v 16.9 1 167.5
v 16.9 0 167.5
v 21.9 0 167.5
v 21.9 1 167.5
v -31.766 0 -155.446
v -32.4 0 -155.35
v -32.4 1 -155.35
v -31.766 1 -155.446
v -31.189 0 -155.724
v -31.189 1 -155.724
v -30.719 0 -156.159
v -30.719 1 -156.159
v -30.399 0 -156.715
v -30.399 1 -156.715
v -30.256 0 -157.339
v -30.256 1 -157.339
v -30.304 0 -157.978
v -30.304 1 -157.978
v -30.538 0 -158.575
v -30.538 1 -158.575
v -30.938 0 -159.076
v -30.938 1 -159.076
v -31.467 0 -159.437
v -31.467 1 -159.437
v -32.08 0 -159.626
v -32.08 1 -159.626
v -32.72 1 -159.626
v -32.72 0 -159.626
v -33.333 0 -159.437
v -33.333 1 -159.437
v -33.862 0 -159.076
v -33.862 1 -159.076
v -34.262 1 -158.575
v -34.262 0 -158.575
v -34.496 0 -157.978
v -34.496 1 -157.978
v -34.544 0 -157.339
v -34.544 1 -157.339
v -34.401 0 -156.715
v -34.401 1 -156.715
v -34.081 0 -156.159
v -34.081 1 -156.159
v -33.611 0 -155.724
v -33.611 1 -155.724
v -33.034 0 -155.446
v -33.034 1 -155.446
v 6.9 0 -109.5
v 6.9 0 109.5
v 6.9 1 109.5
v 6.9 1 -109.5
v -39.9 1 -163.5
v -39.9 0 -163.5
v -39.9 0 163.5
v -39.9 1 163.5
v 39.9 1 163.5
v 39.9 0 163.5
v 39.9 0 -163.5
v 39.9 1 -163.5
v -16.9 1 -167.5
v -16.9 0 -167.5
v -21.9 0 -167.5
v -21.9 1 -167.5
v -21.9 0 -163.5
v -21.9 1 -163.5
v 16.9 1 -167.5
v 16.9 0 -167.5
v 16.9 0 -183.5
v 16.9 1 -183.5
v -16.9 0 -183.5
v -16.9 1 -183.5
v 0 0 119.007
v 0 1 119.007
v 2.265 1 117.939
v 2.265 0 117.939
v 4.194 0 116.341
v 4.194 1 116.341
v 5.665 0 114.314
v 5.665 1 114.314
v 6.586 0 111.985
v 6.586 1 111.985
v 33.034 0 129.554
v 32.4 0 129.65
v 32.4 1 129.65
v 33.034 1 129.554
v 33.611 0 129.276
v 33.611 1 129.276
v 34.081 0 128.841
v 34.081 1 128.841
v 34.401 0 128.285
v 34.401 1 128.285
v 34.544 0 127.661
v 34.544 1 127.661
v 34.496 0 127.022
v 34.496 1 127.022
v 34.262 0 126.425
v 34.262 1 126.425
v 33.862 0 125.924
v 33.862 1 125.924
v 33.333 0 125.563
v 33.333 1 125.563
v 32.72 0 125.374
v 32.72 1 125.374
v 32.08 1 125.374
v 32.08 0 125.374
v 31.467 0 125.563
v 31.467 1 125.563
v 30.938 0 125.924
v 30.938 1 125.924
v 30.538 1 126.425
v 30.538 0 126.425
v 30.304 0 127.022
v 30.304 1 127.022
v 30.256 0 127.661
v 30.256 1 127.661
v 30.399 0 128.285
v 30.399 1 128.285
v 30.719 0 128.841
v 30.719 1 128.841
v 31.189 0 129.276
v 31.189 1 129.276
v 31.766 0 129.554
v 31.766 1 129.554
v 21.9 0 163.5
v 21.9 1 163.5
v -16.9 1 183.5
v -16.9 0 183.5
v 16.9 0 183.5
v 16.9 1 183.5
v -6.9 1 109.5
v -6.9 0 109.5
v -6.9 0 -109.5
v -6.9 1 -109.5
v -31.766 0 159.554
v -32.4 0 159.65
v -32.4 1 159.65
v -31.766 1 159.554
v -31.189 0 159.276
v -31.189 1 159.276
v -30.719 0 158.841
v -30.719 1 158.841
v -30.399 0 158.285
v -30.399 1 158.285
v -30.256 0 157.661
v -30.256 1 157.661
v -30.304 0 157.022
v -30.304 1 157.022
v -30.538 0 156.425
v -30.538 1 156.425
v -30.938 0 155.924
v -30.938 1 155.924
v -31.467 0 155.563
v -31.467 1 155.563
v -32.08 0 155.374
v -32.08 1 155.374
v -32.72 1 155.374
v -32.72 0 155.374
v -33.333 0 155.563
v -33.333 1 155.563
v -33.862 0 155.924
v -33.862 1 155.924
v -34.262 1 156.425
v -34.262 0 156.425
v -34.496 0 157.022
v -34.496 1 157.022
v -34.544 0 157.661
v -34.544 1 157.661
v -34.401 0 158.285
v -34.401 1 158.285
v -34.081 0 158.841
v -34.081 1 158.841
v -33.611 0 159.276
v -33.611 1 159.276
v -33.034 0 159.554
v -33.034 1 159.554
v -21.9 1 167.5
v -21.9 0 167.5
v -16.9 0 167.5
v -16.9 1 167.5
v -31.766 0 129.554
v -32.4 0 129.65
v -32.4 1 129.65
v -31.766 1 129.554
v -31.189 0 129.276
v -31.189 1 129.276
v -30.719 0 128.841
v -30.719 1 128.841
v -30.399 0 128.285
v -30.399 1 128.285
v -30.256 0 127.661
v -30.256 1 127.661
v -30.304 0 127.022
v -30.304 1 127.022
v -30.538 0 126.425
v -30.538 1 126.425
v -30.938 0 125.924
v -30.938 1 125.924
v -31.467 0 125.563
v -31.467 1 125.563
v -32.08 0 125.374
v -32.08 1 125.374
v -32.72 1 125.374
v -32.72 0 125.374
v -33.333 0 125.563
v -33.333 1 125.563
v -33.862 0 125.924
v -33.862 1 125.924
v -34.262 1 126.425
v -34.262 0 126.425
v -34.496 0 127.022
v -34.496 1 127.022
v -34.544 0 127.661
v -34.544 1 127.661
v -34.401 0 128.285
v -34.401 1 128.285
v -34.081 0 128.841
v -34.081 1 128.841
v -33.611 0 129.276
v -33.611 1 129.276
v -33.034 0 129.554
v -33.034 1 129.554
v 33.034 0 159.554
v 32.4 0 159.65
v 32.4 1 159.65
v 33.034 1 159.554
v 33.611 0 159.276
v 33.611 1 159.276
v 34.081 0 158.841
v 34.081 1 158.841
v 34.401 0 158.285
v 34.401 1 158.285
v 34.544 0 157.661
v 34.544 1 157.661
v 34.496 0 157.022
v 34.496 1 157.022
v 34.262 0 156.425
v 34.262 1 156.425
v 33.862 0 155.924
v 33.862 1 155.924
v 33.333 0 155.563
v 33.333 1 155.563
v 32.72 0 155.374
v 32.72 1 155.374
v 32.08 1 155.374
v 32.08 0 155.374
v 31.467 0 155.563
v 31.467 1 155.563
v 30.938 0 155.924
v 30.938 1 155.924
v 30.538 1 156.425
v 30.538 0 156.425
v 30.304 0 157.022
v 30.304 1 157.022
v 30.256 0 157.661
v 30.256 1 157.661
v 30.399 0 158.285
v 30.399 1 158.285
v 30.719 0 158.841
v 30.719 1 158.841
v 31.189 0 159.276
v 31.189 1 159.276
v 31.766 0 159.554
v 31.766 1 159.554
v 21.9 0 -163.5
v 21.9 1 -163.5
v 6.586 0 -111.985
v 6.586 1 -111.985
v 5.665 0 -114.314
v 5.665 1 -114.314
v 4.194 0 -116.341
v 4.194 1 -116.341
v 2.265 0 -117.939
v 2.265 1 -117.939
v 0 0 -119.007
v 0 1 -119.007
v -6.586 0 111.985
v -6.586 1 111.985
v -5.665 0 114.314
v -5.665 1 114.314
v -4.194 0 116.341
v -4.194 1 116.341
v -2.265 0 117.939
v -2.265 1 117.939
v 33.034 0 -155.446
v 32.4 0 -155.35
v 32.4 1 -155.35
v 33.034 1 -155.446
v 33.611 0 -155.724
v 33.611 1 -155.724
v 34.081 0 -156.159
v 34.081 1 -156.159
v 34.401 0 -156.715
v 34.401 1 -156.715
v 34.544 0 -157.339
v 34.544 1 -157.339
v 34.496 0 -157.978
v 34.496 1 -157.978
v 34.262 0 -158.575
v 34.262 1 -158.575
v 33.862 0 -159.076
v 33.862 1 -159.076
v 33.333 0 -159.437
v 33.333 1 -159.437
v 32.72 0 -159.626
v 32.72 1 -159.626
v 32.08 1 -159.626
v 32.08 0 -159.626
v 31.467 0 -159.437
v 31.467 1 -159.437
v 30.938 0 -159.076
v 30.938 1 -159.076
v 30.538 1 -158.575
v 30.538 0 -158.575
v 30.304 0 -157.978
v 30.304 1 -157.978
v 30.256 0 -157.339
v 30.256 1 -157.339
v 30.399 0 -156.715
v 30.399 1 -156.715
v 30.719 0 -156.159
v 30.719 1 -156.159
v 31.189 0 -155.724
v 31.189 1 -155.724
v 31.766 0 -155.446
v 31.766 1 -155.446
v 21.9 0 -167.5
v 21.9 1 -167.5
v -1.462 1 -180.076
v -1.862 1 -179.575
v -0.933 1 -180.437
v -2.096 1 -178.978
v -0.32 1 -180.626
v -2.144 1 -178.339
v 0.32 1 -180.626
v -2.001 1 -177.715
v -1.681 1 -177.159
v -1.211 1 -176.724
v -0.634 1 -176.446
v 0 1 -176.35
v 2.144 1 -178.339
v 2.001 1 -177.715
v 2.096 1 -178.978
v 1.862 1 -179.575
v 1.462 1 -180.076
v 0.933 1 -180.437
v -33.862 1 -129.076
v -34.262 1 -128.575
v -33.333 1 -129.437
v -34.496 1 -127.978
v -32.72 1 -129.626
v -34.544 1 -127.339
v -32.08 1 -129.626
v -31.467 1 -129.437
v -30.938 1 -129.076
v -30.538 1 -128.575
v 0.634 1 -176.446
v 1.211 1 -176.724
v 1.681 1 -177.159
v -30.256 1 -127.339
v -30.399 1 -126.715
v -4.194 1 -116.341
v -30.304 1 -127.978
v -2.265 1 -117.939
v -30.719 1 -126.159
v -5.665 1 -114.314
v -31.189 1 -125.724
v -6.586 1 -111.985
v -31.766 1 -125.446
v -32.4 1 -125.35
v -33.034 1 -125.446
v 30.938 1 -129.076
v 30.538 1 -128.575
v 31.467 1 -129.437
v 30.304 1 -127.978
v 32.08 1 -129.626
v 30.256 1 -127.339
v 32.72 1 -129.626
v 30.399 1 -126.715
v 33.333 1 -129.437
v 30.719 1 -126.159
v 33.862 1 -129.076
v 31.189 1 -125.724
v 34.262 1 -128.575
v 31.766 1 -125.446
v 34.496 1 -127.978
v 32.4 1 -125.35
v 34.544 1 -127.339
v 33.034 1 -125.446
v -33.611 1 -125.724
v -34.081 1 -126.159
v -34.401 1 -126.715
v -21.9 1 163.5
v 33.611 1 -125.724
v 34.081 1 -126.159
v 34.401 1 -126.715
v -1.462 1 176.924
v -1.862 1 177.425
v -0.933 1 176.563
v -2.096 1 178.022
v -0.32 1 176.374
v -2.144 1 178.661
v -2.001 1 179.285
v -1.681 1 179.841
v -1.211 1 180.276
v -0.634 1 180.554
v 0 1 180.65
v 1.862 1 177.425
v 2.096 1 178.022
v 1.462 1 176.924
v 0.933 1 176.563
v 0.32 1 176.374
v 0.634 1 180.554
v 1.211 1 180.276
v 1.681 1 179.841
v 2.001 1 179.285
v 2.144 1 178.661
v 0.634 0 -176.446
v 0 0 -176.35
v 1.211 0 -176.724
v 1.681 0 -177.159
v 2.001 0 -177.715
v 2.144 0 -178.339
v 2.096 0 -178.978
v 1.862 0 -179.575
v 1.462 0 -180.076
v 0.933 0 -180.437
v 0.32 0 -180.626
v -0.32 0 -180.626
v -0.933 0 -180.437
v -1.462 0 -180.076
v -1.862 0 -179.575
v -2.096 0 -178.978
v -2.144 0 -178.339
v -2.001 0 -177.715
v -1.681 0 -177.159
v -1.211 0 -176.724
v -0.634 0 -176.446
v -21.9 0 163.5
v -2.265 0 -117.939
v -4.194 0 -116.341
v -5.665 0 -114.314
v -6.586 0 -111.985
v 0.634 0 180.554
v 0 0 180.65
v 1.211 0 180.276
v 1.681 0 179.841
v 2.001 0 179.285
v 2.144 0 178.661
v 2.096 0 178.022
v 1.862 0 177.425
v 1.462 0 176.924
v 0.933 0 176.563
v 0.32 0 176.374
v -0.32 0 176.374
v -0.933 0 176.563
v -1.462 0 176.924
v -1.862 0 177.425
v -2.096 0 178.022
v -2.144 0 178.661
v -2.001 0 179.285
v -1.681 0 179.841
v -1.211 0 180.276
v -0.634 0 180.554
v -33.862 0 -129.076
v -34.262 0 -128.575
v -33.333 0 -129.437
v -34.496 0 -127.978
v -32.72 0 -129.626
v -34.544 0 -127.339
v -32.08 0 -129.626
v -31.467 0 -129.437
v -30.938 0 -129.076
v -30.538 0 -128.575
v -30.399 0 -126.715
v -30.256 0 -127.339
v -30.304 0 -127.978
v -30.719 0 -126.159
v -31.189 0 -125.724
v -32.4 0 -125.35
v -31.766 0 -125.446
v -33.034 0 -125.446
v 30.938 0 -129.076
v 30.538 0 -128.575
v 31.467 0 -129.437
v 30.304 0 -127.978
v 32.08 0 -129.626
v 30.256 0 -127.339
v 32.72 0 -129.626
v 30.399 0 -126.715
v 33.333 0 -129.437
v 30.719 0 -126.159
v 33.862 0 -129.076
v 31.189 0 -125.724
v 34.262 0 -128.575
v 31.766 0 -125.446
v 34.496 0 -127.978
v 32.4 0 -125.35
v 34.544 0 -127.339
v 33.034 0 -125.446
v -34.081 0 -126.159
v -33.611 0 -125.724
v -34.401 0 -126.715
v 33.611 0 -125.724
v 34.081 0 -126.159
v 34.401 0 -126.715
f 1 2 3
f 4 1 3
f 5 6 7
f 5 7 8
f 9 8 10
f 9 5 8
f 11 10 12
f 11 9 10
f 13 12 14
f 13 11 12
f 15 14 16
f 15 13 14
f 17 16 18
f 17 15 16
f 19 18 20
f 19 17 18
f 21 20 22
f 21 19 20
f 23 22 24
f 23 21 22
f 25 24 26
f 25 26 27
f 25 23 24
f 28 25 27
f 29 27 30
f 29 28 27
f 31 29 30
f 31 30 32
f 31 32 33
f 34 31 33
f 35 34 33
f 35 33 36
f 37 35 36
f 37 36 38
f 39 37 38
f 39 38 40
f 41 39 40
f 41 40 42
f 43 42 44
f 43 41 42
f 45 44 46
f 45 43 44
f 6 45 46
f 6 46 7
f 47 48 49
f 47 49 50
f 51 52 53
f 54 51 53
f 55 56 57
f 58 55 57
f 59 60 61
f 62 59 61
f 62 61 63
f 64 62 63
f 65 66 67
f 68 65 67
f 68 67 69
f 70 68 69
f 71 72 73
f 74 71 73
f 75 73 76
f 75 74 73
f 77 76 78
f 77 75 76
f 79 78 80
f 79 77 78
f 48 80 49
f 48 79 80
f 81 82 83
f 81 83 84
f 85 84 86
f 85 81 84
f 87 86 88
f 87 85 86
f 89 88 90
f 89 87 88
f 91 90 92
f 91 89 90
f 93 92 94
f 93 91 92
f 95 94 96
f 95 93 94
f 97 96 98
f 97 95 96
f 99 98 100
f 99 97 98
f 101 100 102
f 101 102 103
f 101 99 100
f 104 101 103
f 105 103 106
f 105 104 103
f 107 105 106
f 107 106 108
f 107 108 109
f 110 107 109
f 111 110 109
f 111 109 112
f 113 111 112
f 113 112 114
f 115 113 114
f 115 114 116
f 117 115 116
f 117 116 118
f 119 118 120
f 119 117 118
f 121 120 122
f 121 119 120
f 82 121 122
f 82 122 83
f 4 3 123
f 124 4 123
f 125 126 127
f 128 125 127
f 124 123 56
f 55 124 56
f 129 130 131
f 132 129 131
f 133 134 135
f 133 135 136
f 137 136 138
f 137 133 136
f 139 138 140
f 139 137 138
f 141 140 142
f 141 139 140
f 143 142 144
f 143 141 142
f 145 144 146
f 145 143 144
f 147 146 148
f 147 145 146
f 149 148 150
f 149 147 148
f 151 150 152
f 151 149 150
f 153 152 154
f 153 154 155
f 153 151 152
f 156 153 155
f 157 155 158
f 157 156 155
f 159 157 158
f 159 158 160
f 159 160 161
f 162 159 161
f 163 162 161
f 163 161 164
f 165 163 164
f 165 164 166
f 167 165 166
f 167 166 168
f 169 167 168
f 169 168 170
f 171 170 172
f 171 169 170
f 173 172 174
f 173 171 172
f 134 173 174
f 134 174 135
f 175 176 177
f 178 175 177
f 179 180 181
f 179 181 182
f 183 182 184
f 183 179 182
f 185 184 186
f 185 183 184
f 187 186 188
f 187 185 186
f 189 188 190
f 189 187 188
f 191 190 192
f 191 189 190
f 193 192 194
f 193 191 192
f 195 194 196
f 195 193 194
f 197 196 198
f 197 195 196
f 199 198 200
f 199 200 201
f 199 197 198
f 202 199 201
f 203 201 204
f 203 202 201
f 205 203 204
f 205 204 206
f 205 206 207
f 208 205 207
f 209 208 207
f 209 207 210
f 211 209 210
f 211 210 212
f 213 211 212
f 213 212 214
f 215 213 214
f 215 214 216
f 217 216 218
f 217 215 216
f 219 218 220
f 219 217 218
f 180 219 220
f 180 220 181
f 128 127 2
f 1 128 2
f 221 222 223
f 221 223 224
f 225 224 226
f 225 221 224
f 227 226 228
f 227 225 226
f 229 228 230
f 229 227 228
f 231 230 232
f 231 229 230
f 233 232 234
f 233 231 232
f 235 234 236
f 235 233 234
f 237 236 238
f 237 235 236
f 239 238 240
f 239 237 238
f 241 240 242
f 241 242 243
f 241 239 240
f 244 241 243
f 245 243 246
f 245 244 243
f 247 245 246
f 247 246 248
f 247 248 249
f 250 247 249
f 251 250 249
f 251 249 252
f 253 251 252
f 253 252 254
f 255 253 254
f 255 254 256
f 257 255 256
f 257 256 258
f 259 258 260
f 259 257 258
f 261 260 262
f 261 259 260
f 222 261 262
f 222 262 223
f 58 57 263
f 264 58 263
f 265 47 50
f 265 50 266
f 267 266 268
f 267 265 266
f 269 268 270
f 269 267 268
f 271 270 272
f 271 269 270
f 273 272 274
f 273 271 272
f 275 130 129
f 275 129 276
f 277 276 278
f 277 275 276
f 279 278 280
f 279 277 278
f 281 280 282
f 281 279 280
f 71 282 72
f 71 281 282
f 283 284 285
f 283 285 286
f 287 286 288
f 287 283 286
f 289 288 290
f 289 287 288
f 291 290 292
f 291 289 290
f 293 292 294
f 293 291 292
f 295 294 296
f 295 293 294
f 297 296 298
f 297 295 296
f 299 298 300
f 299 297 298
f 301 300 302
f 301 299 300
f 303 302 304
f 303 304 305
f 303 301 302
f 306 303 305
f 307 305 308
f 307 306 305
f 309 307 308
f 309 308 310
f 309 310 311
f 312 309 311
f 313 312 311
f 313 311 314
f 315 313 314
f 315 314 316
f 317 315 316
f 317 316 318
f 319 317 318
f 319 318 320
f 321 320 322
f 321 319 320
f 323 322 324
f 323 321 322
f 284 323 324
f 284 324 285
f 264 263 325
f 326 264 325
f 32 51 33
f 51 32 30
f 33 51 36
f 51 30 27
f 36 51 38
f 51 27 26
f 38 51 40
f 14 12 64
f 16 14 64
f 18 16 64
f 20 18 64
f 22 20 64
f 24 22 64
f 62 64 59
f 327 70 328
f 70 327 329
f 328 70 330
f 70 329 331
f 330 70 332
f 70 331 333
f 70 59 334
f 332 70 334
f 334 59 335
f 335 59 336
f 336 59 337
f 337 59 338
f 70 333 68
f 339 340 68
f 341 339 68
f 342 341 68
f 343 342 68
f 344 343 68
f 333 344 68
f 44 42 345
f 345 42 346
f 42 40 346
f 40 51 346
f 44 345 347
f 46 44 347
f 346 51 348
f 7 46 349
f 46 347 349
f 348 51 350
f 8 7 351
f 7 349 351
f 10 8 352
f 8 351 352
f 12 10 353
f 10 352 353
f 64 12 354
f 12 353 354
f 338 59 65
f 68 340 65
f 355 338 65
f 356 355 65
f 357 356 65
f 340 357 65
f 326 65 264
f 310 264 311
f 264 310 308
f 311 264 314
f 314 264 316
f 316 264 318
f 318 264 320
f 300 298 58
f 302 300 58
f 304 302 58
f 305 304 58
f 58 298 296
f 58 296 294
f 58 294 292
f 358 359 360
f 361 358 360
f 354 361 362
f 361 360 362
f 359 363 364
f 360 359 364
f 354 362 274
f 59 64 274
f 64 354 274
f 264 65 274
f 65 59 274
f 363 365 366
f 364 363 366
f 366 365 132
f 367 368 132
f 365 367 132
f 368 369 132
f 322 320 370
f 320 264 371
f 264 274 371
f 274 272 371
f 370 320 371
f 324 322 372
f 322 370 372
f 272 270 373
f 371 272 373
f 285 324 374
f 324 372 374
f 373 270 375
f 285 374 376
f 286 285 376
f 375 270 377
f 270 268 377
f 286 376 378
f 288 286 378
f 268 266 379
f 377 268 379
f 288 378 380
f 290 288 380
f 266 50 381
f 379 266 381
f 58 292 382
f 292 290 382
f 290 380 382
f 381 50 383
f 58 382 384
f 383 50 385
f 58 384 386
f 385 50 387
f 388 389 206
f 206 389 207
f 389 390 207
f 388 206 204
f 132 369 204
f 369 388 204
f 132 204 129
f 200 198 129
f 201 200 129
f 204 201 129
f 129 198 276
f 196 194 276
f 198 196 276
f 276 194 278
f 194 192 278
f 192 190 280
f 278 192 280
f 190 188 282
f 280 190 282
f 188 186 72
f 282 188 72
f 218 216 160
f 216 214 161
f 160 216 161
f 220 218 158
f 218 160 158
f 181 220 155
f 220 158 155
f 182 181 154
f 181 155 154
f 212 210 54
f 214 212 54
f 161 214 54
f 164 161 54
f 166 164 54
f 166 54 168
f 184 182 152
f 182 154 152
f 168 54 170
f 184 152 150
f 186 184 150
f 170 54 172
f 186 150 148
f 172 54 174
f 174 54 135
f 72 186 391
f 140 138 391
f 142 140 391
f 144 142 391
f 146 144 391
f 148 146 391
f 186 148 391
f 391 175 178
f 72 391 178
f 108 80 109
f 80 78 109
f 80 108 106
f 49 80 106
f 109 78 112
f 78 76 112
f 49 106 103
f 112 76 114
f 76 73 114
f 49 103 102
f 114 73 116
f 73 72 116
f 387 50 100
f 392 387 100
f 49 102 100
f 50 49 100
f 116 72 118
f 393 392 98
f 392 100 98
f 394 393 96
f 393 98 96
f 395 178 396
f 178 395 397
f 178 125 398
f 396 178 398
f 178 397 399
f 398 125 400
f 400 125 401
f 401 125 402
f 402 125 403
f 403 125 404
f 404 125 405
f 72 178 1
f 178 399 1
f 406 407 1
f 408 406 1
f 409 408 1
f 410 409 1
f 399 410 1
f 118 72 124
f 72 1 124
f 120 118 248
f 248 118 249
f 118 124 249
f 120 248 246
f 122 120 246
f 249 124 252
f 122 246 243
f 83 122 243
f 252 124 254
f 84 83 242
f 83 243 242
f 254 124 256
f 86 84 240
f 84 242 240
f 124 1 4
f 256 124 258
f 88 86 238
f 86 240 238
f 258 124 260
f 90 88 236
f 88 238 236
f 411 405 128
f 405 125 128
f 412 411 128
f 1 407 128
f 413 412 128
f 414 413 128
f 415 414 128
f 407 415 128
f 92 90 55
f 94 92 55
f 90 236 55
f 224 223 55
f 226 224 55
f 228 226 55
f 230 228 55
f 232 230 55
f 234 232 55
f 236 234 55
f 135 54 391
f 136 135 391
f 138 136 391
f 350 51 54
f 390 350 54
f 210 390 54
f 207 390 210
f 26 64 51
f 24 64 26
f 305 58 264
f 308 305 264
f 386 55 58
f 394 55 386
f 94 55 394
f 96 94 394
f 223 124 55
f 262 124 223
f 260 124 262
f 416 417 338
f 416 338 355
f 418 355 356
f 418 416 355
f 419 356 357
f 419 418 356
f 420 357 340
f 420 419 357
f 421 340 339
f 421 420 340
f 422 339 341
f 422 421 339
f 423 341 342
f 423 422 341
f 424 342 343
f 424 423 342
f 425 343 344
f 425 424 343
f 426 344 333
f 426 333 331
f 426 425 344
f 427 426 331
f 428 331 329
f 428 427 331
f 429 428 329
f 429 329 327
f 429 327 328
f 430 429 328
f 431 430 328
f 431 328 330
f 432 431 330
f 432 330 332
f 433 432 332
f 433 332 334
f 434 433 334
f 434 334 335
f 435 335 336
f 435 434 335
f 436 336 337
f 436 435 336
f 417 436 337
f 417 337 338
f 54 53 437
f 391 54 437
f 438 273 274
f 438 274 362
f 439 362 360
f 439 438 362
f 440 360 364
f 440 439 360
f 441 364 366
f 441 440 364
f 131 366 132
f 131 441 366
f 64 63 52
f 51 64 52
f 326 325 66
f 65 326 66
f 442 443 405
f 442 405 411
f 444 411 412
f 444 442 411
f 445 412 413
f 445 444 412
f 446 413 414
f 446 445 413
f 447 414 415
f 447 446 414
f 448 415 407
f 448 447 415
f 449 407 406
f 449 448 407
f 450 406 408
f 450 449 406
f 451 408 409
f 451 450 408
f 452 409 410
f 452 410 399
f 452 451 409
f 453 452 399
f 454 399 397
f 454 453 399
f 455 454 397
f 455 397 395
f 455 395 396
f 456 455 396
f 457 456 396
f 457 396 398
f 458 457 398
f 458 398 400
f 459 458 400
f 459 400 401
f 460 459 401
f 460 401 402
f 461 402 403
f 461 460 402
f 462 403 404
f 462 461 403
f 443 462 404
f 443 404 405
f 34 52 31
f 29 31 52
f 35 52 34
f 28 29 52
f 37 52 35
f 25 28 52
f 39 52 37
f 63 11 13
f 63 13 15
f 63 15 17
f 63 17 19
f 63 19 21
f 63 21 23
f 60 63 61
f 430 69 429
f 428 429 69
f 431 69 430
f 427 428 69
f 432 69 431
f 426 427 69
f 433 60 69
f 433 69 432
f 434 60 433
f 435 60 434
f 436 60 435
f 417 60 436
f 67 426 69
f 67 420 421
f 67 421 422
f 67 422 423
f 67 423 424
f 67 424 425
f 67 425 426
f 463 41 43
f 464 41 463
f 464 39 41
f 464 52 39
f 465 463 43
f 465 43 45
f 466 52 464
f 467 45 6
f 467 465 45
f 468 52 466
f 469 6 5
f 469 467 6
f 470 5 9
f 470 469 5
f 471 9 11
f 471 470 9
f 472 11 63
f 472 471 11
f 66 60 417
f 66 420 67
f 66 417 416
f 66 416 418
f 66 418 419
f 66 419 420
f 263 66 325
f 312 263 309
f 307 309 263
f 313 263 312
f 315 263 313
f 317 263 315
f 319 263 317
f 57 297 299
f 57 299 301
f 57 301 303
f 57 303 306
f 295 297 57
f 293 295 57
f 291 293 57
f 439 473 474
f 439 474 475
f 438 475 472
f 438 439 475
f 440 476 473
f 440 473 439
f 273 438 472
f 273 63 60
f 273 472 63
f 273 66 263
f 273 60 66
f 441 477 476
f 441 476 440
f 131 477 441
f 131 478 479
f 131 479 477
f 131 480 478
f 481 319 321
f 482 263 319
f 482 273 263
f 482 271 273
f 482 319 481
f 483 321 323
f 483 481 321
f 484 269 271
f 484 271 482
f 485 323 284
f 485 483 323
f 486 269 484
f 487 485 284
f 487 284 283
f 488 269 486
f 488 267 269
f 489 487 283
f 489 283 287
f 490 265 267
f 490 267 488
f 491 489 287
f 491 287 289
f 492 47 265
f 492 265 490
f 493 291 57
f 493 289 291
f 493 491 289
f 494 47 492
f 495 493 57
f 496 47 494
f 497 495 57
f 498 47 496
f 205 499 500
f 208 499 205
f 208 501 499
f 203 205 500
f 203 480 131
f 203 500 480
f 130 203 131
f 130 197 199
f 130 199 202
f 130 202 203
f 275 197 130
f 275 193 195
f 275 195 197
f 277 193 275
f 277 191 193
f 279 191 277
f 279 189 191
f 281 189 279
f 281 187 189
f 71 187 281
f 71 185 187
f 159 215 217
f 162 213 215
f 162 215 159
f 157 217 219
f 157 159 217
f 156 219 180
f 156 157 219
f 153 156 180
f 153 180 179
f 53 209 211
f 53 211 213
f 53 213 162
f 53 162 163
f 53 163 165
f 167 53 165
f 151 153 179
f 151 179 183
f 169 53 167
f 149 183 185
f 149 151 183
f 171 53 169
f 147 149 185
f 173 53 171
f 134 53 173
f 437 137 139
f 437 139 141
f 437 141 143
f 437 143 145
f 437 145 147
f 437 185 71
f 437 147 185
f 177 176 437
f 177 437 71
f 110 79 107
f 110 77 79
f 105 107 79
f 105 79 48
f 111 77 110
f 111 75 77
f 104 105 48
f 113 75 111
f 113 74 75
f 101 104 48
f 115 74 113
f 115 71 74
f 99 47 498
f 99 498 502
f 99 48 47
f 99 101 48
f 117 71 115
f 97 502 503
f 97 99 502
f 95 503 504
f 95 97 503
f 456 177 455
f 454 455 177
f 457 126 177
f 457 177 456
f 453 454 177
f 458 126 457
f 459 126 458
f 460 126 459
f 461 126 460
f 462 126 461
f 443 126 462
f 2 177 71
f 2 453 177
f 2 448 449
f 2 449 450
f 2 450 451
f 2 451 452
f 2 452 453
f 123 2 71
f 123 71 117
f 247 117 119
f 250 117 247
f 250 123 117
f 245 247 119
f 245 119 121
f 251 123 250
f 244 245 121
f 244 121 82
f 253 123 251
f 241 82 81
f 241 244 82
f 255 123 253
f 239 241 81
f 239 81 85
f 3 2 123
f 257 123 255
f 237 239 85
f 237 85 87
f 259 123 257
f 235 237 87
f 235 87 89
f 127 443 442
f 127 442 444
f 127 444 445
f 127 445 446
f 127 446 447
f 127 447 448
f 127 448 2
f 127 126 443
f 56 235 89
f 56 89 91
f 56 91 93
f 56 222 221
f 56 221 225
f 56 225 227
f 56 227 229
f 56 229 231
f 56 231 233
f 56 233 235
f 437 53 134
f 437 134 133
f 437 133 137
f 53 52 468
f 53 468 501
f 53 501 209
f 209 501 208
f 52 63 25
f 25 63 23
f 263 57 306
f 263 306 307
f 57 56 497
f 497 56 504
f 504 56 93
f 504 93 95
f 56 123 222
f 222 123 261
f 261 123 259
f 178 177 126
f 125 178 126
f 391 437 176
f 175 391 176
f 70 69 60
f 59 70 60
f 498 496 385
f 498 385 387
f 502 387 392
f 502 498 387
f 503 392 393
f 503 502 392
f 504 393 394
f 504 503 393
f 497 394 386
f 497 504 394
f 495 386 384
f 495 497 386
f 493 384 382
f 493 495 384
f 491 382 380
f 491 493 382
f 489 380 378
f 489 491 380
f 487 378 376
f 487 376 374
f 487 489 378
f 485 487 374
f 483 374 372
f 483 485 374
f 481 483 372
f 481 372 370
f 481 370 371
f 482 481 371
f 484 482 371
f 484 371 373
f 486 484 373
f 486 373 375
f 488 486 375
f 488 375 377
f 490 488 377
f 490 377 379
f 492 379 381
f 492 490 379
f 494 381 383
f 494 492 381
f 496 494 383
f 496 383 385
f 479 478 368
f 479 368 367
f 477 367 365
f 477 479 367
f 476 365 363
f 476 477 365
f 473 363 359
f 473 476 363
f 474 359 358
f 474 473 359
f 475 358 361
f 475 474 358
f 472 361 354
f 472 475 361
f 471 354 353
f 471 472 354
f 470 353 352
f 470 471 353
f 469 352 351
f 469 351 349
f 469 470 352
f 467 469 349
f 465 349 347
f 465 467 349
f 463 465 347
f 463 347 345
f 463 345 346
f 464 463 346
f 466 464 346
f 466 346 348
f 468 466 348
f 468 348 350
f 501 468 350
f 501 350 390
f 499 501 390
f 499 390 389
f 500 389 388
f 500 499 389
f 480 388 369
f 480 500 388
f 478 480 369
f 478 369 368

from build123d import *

# Parameters (mm, degrees)
SKETCH1_R           = 2.15
SKETCH1_W           = 13.8
SKETCH1_H           = 239
BOSS_EXTRUDE1_DEPTH = 1
FILLET2_R           = 10


with BuildPart() as part:
    # Sketch1 → Boss-Extrude1 (new body)
    with BuildSketch(Plane(origin=(0, 0, 0), x_dir=(1, 0, 0), z_dir=(0, 1, 0))):
        Polygon((-39.9, -163.5), (-21.9, -163.5), (-21.9, -167.5), (-16.9, -167.5), (-16.9, -183.5), (16.9, -183.5), (16.9, -167.5), (21.9, -167.5), (21.9, -163.5), (39.9, -163.5), (39.9, 163.5), (21.9, 163.5), (21.9, 167.5), (16.9, 167.5), (16.9, 183.5), (-16.9, 183.5), (-16.9, 167.5), (-21.9, 167.5), (-21.9, 163.5), (-39.9, 163.5), align=None)
        with Locations(Location((-32.4, 127.5, 0), (0, 0, 270))):
            Circle(SKETCH1_R, mode=Mode.SUBTRACT)
        with Locations(Location((32.4, 127.5, 0), (0, 0, 270))):
            Circle(SKETCH1_R, mode=Mode.SUBTRACT)
        with Locations(Location((-32.4, -127.5, 0), (0, 0, 270))):
            Circle(SKETCH1_R, mode=Mode.SUBTRACT)
        with Locations(Location((32.4, -127.5, 0), (0, 0, 270))):
            Circle(SKETCH1_R, mode=Mode.SUBTRACT)
        with Locations(Location((-32.4, -157.5, 0), (0, 0, 270))):
            Circle(SKETCH1_R, mode=Mode.SUBTRACT)
        with Locations(Location((32.4, -157.5, 0), (0, 0, 270))):
            Circle(SKETCH1_R, mode=Mode.SUBTRACT)
        with Locations(Location((32.4, 157.5, 0), (0, 0, 270))):
            Circle(SKETCH1_R, mode=Mode.SUBTRACT)
        with Locations(Location((-32.4, 157.5, 0), (0, 0, 270))):
            Circle(SKETCH1_R, mode=Mode.SUBTRACT)
        with Locations(Location((0, 178.5, 0), (0, 0, 270))):
            Circle(SKETCH1_R, mode=Mode.SUBTRACT)
        with Locations(Location((0, -178.5, 0), (0, 0, 270))):
            Circle(SKETCH1_R, mode=Mode.SUBTRACT)
        Rectangle(SKETCH1_W, SKETCH1_H, mode=Mode.SUBTRACT)
    extrude(amount=BOSS_EXTRUDE1_DEPTH)

    # Fillet2
    # the kernel refuses this fillet: 10 mm, written as the material it adds along each edge
    with BuildSketch(Plane(origin=(6.9, 0, -119.5), x_dir=(-1, 0, 0), z_dir=(0, 1, 0)), Plane(origin=(6.9, 0, 119.5), x_dir=(0, 0, -1), z_dir=(0, 1, 0)), Plane(origin=(-6.9, 0, 119.5), x_dir=(1, 0, 0), z_dir=(0, 1, 0))) as fillet2_piece_1:
        with BuildLine():
            CenterArc((FILLET2_R, FILLET2_R), FILLET2_R, 180, 90)
            Line((0, FILLET2_R), (0, 0))
            Line((0, 0), (FILLET2_R, 0))
        make_face()
    extrude(amount=1)
    with BuildSketch(Plane(origin=(-6.9, 0, -119.5), x_dir=(1, 0, 0), z_dir=(0, 1, 0))) as fillet2_piece_2:
        with BuildLine():
            CenterArc((FILLET2_R, -FILLET2_R), FILLET2_R, 90, 90)
            Line((0, -FILLET2_R), (0, 0))
            Line((0, 0), (FILLET2_R, 0))
        make_face()
    extrude(amount=1)


solid = part.part
